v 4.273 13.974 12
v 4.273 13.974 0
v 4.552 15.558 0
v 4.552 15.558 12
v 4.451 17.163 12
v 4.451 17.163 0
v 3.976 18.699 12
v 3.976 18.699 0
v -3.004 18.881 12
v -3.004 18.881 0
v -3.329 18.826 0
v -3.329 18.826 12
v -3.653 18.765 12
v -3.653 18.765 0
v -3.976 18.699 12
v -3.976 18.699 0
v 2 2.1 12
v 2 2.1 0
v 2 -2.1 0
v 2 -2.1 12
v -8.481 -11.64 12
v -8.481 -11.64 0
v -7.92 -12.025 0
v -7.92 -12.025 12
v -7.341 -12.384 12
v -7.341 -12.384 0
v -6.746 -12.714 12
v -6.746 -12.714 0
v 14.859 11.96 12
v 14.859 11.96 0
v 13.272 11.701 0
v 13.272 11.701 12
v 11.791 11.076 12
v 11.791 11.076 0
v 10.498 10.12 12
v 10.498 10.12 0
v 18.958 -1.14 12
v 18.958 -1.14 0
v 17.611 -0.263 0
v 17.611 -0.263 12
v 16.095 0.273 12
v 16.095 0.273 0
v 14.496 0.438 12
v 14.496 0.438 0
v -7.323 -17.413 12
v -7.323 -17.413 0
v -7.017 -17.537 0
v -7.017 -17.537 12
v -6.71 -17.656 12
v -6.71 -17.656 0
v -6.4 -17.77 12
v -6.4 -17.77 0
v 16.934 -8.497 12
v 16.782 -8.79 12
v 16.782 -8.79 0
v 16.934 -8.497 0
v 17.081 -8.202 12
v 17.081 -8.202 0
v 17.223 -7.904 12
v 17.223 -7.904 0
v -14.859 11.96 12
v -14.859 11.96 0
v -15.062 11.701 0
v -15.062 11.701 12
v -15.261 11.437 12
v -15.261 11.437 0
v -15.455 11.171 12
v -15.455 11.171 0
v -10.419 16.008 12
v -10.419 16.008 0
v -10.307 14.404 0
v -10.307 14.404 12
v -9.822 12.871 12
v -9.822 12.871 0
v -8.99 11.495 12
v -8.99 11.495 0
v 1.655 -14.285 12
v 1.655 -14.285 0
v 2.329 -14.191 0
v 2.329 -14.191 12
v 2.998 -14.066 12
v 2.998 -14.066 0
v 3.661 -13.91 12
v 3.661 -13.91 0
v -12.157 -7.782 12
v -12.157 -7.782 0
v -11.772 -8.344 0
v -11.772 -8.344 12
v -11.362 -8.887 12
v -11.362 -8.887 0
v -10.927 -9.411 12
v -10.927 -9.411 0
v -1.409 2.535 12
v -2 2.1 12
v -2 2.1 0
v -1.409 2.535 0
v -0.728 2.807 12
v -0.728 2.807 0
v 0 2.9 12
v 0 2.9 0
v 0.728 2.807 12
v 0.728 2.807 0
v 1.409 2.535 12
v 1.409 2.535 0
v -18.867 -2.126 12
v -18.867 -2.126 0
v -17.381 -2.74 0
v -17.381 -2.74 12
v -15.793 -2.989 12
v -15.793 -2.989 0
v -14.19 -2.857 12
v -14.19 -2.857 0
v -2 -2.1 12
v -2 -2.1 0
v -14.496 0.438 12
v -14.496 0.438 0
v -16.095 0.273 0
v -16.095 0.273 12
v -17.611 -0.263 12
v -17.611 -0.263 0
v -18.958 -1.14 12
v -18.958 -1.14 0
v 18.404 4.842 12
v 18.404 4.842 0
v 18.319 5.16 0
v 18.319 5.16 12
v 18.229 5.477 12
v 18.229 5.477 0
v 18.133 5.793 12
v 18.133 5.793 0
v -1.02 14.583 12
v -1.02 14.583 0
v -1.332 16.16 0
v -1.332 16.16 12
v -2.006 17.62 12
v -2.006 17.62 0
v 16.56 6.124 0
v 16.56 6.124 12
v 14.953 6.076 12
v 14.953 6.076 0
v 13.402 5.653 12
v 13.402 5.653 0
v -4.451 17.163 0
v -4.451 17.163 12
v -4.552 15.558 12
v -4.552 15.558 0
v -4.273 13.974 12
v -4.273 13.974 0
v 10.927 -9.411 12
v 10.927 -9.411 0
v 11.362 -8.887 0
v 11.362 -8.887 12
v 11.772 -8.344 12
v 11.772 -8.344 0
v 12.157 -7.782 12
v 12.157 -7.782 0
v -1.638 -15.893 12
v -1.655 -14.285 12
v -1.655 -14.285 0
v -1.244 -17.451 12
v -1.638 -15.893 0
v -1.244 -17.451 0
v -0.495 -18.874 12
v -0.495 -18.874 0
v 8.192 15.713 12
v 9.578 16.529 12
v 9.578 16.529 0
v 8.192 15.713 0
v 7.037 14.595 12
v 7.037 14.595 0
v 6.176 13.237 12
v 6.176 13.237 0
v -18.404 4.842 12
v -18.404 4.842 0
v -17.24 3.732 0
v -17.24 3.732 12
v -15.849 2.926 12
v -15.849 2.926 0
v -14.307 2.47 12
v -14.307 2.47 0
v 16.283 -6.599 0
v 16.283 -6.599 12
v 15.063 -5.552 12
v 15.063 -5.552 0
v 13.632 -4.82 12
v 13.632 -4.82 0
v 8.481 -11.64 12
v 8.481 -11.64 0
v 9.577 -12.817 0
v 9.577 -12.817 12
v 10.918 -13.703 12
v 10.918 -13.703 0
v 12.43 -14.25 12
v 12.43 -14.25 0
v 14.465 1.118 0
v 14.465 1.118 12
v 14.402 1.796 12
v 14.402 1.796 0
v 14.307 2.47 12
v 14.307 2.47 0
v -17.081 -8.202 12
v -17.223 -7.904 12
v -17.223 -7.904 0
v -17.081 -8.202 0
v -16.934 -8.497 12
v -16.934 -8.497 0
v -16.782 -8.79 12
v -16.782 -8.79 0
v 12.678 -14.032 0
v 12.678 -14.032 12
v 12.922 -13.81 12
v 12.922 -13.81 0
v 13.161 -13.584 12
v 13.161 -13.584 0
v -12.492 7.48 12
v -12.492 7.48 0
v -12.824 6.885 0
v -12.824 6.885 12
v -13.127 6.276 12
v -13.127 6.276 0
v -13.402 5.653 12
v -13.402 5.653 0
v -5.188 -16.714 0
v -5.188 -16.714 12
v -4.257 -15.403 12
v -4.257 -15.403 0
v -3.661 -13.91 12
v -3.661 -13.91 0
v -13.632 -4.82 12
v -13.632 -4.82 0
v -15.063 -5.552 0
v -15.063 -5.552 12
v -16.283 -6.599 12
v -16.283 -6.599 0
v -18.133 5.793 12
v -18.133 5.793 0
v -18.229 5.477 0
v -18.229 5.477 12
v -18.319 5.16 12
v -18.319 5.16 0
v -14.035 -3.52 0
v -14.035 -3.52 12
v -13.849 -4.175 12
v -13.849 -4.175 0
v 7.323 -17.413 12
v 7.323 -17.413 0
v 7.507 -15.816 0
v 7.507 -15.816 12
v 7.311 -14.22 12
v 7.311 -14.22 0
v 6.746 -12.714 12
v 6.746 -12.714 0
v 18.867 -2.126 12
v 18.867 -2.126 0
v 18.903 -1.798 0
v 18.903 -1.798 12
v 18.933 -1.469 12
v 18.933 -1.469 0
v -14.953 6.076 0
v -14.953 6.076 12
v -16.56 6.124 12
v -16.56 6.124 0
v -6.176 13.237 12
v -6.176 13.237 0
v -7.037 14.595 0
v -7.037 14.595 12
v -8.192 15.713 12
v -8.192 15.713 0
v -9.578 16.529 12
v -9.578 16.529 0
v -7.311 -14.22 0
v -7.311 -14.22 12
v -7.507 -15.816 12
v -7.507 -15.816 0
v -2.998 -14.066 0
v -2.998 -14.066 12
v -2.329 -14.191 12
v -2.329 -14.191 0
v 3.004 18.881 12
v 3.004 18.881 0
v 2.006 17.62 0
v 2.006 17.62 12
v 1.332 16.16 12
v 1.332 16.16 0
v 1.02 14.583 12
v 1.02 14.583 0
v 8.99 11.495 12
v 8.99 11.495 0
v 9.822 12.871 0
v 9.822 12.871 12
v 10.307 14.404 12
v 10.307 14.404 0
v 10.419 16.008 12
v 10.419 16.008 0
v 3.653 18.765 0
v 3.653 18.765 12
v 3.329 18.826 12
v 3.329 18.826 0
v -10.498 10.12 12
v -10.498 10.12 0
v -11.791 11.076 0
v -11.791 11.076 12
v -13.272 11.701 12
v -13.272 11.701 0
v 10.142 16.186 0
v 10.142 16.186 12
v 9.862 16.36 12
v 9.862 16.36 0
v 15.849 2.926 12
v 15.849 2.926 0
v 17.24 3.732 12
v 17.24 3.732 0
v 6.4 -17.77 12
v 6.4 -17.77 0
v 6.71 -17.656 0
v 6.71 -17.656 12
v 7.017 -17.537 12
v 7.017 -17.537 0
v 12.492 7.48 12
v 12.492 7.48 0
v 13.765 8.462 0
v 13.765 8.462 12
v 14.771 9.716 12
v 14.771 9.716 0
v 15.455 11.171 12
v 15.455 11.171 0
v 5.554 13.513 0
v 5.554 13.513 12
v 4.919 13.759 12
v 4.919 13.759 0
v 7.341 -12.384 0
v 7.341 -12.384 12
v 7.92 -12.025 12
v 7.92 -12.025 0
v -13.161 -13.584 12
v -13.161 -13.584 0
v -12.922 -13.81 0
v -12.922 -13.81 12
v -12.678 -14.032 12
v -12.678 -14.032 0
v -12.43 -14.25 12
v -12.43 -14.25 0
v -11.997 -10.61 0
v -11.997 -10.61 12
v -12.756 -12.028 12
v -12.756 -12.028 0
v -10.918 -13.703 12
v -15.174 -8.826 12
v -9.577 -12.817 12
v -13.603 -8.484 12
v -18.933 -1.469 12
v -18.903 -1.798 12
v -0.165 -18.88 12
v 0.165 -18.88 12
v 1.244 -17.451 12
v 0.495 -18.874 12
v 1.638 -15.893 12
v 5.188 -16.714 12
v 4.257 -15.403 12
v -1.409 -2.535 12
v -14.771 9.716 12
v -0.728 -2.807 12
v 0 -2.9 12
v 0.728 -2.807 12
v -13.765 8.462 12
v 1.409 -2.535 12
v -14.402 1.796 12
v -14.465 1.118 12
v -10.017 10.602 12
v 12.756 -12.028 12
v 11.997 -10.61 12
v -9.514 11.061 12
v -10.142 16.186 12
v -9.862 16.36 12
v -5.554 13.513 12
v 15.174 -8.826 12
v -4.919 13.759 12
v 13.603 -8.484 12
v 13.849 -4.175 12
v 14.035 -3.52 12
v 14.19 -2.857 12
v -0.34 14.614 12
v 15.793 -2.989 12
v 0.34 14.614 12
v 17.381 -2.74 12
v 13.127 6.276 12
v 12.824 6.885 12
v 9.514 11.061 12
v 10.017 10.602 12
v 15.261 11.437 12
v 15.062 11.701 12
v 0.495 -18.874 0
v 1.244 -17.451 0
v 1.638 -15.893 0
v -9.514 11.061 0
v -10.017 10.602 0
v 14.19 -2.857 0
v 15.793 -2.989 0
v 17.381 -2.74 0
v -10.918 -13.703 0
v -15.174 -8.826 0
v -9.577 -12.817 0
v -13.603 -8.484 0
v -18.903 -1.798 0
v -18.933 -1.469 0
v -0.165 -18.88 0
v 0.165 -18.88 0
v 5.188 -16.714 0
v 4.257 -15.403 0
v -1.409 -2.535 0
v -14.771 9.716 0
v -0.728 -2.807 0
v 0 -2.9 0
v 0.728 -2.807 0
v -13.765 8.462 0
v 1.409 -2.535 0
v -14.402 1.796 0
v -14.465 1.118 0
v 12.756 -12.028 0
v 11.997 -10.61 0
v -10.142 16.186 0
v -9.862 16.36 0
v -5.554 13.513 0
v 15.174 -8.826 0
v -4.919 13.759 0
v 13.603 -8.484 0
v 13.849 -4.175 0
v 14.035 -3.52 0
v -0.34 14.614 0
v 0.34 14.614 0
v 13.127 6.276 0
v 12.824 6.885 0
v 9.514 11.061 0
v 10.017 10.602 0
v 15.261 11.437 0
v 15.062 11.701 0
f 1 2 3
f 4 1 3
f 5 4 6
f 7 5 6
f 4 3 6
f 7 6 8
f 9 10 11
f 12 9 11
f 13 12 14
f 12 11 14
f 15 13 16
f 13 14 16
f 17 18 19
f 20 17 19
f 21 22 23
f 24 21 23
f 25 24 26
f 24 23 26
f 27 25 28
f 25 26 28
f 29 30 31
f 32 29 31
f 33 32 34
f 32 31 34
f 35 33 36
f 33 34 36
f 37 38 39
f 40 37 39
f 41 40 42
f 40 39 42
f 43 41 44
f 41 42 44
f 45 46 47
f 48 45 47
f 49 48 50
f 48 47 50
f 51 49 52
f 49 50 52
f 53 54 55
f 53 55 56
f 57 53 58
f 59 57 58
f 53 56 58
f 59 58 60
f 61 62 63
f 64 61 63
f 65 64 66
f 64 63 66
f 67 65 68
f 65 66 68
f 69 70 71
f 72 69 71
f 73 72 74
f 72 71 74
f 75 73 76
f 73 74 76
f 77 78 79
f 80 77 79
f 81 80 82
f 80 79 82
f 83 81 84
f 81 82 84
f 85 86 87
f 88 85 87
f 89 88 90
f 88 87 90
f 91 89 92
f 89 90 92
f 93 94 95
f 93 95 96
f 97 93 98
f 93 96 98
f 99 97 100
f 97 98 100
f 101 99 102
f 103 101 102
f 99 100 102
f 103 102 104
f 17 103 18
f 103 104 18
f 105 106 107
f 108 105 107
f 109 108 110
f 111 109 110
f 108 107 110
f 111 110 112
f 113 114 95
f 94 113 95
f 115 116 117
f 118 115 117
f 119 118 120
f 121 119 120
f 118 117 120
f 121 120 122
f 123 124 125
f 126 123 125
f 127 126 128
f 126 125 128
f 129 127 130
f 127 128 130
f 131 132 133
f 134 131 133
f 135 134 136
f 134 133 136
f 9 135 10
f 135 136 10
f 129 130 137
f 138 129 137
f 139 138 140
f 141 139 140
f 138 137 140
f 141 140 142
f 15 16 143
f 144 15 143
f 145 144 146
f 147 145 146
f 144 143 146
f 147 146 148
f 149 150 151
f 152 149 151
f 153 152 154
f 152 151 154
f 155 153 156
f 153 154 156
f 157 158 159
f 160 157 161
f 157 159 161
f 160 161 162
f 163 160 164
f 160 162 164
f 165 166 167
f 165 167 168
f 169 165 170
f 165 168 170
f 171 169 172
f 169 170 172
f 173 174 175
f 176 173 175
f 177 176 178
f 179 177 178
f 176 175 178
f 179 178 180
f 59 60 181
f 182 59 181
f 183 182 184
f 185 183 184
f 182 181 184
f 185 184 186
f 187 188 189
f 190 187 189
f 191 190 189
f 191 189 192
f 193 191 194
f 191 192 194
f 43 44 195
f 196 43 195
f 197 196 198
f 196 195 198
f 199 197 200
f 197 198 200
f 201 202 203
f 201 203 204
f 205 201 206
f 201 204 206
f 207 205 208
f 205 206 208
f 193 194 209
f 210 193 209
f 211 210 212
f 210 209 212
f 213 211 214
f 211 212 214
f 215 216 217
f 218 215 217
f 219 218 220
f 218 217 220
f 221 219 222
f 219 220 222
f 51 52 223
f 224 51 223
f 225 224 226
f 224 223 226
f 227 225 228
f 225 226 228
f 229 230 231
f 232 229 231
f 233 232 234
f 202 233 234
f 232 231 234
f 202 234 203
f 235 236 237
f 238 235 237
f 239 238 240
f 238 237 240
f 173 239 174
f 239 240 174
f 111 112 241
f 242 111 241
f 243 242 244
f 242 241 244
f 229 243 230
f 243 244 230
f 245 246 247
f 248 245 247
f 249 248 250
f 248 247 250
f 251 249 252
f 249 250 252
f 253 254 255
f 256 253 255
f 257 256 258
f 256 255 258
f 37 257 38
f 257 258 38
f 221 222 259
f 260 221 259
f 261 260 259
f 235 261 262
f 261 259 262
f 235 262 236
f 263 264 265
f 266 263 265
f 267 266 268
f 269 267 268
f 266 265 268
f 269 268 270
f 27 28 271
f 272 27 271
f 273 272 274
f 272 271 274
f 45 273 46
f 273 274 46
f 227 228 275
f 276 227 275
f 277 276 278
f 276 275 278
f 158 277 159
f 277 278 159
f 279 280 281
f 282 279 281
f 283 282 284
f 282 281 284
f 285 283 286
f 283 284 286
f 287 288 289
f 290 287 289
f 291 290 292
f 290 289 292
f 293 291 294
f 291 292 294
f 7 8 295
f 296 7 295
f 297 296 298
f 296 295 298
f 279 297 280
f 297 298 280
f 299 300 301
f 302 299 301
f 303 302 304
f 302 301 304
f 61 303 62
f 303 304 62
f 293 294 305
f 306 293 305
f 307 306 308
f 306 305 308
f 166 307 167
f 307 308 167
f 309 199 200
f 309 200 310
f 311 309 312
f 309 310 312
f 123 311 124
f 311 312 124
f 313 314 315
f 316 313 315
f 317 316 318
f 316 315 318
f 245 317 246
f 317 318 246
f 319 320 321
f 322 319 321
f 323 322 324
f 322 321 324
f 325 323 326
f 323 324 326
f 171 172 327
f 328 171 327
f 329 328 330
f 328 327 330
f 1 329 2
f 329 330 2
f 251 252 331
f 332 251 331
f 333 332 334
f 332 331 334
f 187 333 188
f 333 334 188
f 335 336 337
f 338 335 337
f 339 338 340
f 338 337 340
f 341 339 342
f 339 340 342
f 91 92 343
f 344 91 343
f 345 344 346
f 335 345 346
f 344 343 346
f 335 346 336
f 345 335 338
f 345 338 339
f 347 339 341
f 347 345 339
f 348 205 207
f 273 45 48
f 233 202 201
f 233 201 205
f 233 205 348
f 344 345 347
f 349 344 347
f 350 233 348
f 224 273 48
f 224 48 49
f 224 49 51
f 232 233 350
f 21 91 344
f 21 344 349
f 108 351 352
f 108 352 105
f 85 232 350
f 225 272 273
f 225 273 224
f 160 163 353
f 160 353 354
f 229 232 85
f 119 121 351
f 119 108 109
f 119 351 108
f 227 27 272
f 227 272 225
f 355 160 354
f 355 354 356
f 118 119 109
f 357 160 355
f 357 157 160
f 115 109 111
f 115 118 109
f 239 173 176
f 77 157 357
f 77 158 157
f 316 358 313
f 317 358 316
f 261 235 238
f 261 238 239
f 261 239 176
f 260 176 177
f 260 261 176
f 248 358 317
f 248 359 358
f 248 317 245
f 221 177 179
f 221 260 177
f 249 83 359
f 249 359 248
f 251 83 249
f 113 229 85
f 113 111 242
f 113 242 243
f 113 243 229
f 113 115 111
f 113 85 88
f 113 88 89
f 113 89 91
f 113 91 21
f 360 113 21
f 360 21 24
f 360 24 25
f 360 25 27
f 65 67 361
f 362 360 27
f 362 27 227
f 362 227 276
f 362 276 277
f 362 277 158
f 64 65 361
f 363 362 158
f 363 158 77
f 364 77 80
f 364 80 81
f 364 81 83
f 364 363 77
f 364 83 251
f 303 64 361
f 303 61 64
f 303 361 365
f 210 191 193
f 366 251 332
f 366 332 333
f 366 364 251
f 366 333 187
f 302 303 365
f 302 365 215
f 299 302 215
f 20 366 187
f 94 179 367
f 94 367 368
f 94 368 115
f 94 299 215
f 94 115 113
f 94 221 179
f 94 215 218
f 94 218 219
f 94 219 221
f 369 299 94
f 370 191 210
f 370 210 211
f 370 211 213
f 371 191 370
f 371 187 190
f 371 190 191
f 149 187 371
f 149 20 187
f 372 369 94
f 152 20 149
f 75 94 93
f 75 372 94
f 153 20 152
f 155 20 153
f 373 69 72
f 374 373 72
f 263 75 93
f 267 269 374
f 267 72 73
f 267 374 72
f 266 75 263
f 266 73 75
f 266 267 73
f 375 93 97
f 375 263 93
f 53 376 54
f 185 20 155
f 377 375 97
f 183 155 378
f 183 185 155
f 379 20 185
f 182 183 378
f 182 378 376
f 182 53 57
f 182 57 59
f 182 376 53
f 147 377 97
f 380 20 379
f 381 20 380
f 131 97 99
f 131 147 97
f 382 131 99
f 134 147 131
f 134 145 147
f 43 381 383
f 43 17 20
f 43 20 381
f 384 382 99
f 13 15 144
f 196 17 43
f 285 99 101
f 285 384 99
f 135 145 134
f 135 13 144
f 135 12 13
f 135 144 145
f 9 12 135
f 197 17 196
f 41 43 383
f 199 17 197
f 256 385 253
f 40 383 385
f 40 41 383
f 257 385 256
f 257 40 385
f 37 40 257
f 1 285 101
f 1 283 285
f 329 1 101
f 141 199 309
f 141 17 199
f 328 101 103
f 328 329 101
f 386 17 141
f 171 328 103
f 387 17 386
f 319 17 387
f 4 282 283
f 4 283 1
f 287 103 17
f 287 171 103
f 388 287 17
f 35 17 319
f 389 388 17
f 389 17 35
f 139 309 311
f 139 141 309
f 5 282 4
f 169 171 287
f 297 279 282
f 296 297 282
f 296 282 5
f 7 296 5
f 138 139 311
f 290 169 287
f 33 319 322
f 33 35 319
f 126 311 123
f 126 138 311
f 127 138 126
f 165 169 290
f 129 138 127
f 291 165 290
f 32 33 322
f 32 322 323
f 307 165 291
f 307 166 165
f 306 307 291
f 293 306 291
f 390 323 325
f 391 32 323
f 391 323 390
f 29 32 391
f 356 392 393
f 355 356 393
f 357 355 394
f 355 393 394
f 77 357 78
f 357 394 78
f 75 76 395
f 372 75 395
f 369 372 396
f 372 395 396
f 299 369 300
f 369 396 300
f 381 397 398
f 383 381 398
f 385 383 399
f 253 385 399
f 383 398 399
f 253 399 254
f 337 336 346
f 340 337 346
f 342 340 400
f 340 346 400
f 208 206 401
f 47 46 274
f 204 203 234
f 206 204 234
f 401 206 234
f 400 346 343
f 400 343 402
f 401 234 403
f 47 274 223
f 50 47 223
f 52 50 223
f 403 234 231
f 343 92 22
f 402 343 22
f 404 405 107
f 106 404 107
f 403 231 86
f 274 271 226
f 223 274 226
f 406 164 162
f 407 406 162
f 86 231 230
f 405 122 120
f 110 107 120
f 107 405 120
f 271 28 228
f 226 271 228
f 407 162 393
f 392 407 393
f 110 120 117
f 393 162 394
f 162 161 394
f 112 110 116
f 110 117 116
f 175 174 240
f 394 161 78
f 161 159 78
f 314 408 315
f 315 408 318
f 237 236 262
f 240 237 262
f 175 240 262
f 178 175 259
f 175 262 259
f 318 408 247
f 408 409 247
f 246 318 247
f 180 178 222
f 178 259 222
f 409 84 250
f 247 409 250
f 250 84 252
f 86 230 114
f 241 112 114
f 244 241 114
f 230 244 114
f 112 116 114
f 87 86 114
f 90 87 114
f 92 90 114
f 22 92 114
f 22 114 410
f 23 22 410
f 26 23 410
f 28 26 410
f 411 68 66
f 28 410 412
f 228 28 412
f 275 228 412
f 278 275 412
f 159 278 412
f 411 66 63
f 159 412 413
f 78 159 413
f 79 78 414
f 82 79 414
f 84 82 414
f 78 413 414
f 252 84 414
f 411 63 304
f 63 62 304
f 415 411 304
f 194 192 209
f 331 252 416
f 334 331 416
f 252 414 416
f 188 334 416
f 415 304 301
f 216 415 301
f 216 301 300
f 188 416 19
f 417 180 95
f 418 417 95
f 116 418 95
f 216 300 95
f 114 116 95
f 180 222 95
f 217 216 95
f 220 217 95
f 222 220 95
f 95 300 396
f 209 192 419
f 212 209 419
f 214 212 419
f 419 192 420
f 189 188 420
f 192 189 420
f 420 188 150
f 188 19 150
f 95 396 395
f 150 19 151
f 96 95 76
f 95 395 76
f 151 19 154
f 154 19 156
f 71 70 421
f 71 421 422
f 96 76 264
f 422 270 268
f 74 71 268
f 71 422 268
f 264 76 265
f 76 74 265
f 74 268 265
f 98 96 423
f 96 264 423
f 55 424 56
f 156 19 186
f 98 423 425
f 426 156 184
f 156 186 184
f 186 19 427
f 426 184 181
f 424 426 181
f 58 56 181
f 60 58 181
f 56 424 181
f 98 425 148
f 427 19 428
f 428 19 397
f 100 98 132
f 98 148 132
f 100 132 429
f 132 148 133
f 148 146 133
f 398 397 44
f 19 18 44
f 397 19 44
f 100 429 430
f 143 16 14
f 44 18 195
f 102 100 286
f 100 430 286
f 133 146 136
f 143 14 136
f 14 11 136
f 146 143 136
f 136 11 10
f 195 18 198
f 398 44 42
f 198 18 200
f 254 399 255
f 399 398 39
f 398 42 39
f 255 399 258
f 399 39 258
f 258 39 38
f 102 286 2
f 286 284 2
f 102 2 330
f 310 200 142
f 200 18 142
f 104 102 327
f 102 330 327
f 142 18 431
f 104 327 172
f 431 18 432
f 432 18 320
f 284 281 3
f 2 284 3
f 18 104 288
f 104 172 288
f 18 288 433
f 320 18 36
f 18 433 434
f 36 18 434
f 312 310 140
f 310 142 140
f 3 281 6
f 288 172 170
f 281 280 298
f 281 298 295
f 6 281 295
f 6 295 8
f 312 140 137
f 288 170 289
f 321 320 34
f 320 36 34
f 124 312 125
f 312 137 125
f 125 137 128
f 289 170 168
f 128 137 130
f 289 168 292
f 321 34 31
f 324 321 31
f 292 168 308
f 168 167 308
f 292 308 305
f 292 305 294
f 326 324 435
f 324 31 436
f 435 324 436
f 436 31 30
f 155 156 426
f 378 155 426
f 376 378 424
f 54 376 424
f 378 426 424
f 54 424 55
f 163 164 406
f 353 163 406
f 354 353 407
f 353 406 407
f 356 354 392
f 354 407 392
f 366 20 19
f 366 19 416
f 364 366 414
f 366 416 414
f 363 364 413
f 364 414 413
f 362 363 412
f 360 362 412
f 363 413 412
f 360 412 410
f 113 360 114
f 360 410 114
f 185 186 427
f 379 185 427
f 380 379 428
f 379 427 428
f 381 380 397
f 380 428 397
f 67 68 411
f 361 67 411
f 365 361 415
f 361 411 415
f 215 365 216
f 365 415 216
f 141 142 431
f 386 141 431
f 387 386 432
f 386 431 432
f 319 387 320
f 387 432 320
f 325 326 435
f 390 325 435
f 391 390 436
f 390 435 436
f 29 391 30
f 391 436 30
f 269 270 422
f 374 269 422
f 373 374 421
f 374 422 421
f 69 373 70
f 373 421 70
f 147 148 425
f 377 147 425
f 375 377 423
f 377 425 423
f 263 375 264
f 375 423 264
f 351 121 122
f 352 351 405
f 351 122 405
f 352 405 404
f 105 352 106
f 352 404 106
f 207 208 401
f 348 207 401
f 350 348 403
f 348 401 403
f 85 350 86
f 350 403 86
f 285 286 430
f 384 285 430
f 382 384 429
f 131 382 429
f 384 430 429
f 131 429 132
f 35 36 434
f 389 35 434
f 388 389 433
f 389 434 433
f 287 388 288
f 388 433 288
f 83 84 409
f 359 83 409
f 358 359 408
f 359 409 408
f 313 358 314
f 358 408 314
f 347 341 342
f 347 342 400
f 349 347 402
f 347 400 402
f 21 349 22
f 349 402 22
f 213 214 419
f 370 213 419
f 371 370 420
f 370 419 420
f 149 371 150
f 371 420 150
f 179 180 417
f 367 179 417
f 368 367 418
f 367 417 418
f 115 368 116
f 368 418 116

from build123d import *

# Parameters (mm, degrees)
SALIENTE_EXTRUIR1_DEPTH    = 12
CORTAR_EXTRUIR1_DEPTH      = 30.323828441
CORTAR_EXTRUIR1_DEPTH_BACK = 30.323828441


with BuildPart() as part:
    # Croquis2 → Saliente-Extruir1 (new body)
    with BuildSketch(Plane.XY):
        with BuildLine():
            ThreePointArc((-18.403869346, 4.841504781), (-16.568558398, 3.287756261), (-14.307209233, 2.469953906))
            ThreePointArc((-14.307209233, 2.469953906), (-14.437149822, 1.457270995), (-14.495501716, 0.437954415))
            ThreePointArc((-14.495501716, 0.437954415), (-16.868617902, 0.049598518), (-18.958179734, -1.140456979))
            ThreePointArc((-18.958179734, -1.140456979), (-18.91894935, -1.633626778), (-18.86689205, -2.125607989))
            ThreePointArc((-18.86689205, -2.125607989), (-16.594236855, -2.91144455), (-14.190167272, -2.857128995))
            ThreePointArc((-14.190167272, -2.857128995), (-13.94551, -3.848367642), (-13.631701901, -4.819931181))
            ThreePointArc((-13.631701901, -4.819931181), (-15.70427651, -6.039330716), (-17.22283726, -7.903861216))
            ThreePointArc((-17.22283726, -7.903861216), (-17.008102536, -8.349556708), (-16.781836437, -8.789510259))
            ThreePointArc((-16.781836437, -8.789510259), (-14.378771672, -8.70130328), (-12.15666459, -7.782205431))
            ThreePointArc((-12.15666459, -7.782205431), (-11.570451778, -8.618127541), (-10.926865208, -9.410723))
            ThreePointArc((-10.926865208, -9.410723), (-12.418985555, -11.296479508), (-13.161455179, -13.583669836))
            ThreePointArc((-13.161455179, -13.583669836), (-12.800217229, -13.921697376), (-12.430300822, -14.250205101))
            ThreePointArc((-12.430300822, -14.250205101), (-10.221373699, -13.299867423), (-8.481336993, -11.640116539))
            ThreePointArc((-8.481336993, -11.640116539), (-7.63273993, -12.207826199), (-6.746294822, -12.714409169))
            ThreePointArc((-6.746294822, -12.714409169), (-7.456441785, -15.011840784), (-7.322545645, -17.412793212))
            ThreePointArc((-7.322545645, -17.412793212), (-6.863591658, -17.597500307), (-6.399984203, -17.770195419))
            ThreePointArc((-6.399984203, -17.770195419), (-4.68352257, -16.086075411), (-3.660557838, -13.909830045))
            ThreePointArc((-3.660557838, -13.909830045), (-2.664184259, -14.132654921), (-1.654599937, -14.284808564))
            ThreePointArc((-1.654599937, -14.284808564), (-1.486864235, -16.683634417), (-0.494685747, -18.874087015))
            ThreePointArc((-0.494685747, -18.874087015), (0, -18.880527949), (0.494685747, -18.874087015))
            ThreePointArc((0.494685747, -18.874087015), (1.486864235, -16.683634417), (1.654599937, -14.284808564))
            ThreePointArc((1.654599937, -14.284808564), (2.664184259, -14.132654921), (3.660557838, -13.909830045))
            ThreePointArc((3.660557838, -13.909830045), (4.68352257, -16.086075411), (6.399984203, -17.770195419))
            ThreePointArc((6.399984203, -17.770195419), (6.863591658, -17.597500307), (7.322545645, -17.412793212))
            ThreePointArc((7.322545645, -17.412793212), (7.456441785, -15.011840784), (6.746294822, -12.714409169))
            ThreePointArc((6.746294822, -12.714409169), (7.63273993, -12.207826199), (8.481336993, -11.640116539))
            ThreePointArc((8.481336993, -11.640116539), (10.221373699, -13.299867423), (12.430300822, -14.250205101))
            ThreePointArc((12.430300822, -14.250205101), (12.800217229, -13.921697376), (13.161455179, -13.583669836))
            ThreePointArc((13.161455179, -13.583669836), (12.418985555, -11.296479508), (10.926865208, -9.410723))
            ThreePointArc((10.926865208, -9.410723), (11.570451778, -8.618127541), (12.15666459, -7.782205431))
            ThreePointArc((12.15666459, -7.782205431), (14.378771672, -8.70130328), (16.781836437, -8.789510259))
            ThreePointArc((16.781836437, -8.789510259), (17.008102536, -8.349556708), (17.22283726, -7.903861216))
            ThreePointArc((17.22283726, -7.903861216), (15.70427651, -6.039330716), (13.631701901, -4.819931181))
            ThreePointArc((13.631701901, -4.819931181), (13.94551, -3.848367642), (14.190167272, -2.857128995))
            ThreePointArc((14.190167272, -2.857128995), (16.594236855, -2.91144455), (18.86689205, -2.125607989))
            ThreePointArc((18.86689205, -2.125607989), (18.91894935, -1.633626778), (18.958179734, -1.140456979))
            ThreePointArc((18.958179734, -1.140456979), (16.868617902, 0.049598518), (14.495501716, 0.437954415))
            ThreePointArc((14.495501716, 0.437954415), (14.437149822, 1.457270995), (14.307209233, 2.469953906))
            ThreePointArc((14.307209233, 2.469953906), (16.568558398, 3.287756261), (18.403869346, 4.841504781))
            ThreePointArc((18.403869346, 4.841504781), (18.27468722, 5.319068863), (18.133114985, 5.793107654))
            ThreePointArc((18.133114985, 5.793107654), (15.754758974, 6.147964559), (13.401603701, 5.652827203))
            ThreePointArc((13.401603701, 5.652827203), (12.978972561, 6.582232472), (12.491983309, 7.479591209))
            ThreePointArc((12.491983309, 7.479591209), (14.305204321, 9.059062734), (15.455302108, 11.170880865))
            ThreePointArc((15.455302108, 11.170880865), (15.162327318, 11.569530143), (14.859072577, 11.960416361))
            ThreePointArc((14.859072577, 11.960416361), (12.513132546, 11.432149282), (10.497744846, 10.120389716))
            ThreePointArc((10.497744846, 10.120389716), (9.767913137, 10.834362342), (8.989645818, 11.495203635))
            ThreePointArc((8.989645818, 11.495203635), (10.109853132, 13.623027949), (10.419410679, 16.007702951))
            ThreePointArc((10.419410679, 16.007702951), (10.002211095, 16.27359763), (9.578230081, 16.528539926))
            ThreePointArc((9.578230081, 16.528539926), (7.58153823, 15.188494259), (6.17610738, 13.237272882))
            ThreePointArc((6.17610738, 13.237272882), (5.237642918, 13.639386906), (4.273206846, 13.974460476))
            ThreePointArc((4.273206846, 13.974460476), (4.549110257, 16.363263115), (3.976320102, 18.698731414))
            ThreePointArc((3.976320102, 18.698731414), (3.491240839, 18.795960945), (3.003794538, 18.880527949))
            ThreePointArc((3.003794538, 18.880527949), (1.626015166, 16.909684287), (1.020352389, 14.582524357))
            ThreePointArc((1.020352389, 14.582524357), (0, 14.618472051), (-1.020352389, 14.582524357))
            ThreePointArc((-1.020352389, 14.582524357), (-1.626015166, 16.909684287), (-3.003794538, 18.880527949))
            ThreePointArc((-3.003794538, 18.880527949), (-3.491240839, 18.795960945), (-3.976320102, 18.698731414))
            ThreePointArc((-3.976320102, 18.698731414), (-4.549110257, 16.363263115), (-4.273206846, 13.974460476))
            ThreePointArc((-4.273206846, 13.974460476), (-5.237642918, 13.639386906), (-6.17610738, 13.237272882))
            ThreePointArc((-6.17610738, 13.237272882), (-7.58153823, 15.188494259), (-9.578230081, 16.528539926))
            ThreePointArc((-9.578230081, 16.528539926), (-10.002211095, 16.27359763), (-10.419410679, 16.007702951))
            ThreePointArc((-10.419410679, 16.007702951), (-10.109853132, 13.623027949), (-8.989645818, 11.495203635))
            ThreePointArc((-8.989645818, 11.495203635), (-9.767913137, 10.834362342), (-10.497744846, 10.120389716))
            ThreePointArc((-10.497744846, 10.120389716), (-12.513132546, 11.432149282), (-14.859072577, 11.960416361))
            ThreePointArc((-14.859072577, 11.960416361), (-15.162327318, 11.569530143), (-15.455302108, 11.170880865))
            ThreePointArc((-15.455302108, 11.170880865), (-14.305204321, 9.059062734), (-12.491983309, 7.479591209))
            ThreePointArc((-12.491983309, 7.479591209), (-12.978972561, 6.582232472), (-13.401603701, 5.652827203))
            ThreePointArc((-13.401603701, 5.652827203), (-15.754758974, 6.147964559), (-18.133114985, 5.793107654))
            ThreePointArc((-18.133114985, 5.793107654), (-18.27468722, 5.319068863), (-18.403869346, 4.841504781))
        make_face()
    extrude(amount=SALIENTE_EXTRUIR1_DEPTH)

    # Croquis3 → Cortar-Extruir1 (cut, two sides: drawn at the far end of the back side and taken through both)
    with BuildSketch(Plane.XY.offset(12).offset(-CORTAR_EXTRUIR1_DEPTH_BACK)):
        with BuildLine():
            Line((-2, -2.1), (-2, 2.1))
            ThreePointArc((-2, 2.1), (0, 2.9), (2, 2.1))
            Line((2, 2.1), (2, -2.1))
            ThreePointArc((2, -2.1), (0, -2.9), (-2, -2.1))
        make_face()
    extrude(amount=CORTAR_EXTRUIR1_DEPTH + CORTAR_EXTRUIR1_DEPTH_BACK, mode=Mode.SUBTRACT)


solid = part.part
